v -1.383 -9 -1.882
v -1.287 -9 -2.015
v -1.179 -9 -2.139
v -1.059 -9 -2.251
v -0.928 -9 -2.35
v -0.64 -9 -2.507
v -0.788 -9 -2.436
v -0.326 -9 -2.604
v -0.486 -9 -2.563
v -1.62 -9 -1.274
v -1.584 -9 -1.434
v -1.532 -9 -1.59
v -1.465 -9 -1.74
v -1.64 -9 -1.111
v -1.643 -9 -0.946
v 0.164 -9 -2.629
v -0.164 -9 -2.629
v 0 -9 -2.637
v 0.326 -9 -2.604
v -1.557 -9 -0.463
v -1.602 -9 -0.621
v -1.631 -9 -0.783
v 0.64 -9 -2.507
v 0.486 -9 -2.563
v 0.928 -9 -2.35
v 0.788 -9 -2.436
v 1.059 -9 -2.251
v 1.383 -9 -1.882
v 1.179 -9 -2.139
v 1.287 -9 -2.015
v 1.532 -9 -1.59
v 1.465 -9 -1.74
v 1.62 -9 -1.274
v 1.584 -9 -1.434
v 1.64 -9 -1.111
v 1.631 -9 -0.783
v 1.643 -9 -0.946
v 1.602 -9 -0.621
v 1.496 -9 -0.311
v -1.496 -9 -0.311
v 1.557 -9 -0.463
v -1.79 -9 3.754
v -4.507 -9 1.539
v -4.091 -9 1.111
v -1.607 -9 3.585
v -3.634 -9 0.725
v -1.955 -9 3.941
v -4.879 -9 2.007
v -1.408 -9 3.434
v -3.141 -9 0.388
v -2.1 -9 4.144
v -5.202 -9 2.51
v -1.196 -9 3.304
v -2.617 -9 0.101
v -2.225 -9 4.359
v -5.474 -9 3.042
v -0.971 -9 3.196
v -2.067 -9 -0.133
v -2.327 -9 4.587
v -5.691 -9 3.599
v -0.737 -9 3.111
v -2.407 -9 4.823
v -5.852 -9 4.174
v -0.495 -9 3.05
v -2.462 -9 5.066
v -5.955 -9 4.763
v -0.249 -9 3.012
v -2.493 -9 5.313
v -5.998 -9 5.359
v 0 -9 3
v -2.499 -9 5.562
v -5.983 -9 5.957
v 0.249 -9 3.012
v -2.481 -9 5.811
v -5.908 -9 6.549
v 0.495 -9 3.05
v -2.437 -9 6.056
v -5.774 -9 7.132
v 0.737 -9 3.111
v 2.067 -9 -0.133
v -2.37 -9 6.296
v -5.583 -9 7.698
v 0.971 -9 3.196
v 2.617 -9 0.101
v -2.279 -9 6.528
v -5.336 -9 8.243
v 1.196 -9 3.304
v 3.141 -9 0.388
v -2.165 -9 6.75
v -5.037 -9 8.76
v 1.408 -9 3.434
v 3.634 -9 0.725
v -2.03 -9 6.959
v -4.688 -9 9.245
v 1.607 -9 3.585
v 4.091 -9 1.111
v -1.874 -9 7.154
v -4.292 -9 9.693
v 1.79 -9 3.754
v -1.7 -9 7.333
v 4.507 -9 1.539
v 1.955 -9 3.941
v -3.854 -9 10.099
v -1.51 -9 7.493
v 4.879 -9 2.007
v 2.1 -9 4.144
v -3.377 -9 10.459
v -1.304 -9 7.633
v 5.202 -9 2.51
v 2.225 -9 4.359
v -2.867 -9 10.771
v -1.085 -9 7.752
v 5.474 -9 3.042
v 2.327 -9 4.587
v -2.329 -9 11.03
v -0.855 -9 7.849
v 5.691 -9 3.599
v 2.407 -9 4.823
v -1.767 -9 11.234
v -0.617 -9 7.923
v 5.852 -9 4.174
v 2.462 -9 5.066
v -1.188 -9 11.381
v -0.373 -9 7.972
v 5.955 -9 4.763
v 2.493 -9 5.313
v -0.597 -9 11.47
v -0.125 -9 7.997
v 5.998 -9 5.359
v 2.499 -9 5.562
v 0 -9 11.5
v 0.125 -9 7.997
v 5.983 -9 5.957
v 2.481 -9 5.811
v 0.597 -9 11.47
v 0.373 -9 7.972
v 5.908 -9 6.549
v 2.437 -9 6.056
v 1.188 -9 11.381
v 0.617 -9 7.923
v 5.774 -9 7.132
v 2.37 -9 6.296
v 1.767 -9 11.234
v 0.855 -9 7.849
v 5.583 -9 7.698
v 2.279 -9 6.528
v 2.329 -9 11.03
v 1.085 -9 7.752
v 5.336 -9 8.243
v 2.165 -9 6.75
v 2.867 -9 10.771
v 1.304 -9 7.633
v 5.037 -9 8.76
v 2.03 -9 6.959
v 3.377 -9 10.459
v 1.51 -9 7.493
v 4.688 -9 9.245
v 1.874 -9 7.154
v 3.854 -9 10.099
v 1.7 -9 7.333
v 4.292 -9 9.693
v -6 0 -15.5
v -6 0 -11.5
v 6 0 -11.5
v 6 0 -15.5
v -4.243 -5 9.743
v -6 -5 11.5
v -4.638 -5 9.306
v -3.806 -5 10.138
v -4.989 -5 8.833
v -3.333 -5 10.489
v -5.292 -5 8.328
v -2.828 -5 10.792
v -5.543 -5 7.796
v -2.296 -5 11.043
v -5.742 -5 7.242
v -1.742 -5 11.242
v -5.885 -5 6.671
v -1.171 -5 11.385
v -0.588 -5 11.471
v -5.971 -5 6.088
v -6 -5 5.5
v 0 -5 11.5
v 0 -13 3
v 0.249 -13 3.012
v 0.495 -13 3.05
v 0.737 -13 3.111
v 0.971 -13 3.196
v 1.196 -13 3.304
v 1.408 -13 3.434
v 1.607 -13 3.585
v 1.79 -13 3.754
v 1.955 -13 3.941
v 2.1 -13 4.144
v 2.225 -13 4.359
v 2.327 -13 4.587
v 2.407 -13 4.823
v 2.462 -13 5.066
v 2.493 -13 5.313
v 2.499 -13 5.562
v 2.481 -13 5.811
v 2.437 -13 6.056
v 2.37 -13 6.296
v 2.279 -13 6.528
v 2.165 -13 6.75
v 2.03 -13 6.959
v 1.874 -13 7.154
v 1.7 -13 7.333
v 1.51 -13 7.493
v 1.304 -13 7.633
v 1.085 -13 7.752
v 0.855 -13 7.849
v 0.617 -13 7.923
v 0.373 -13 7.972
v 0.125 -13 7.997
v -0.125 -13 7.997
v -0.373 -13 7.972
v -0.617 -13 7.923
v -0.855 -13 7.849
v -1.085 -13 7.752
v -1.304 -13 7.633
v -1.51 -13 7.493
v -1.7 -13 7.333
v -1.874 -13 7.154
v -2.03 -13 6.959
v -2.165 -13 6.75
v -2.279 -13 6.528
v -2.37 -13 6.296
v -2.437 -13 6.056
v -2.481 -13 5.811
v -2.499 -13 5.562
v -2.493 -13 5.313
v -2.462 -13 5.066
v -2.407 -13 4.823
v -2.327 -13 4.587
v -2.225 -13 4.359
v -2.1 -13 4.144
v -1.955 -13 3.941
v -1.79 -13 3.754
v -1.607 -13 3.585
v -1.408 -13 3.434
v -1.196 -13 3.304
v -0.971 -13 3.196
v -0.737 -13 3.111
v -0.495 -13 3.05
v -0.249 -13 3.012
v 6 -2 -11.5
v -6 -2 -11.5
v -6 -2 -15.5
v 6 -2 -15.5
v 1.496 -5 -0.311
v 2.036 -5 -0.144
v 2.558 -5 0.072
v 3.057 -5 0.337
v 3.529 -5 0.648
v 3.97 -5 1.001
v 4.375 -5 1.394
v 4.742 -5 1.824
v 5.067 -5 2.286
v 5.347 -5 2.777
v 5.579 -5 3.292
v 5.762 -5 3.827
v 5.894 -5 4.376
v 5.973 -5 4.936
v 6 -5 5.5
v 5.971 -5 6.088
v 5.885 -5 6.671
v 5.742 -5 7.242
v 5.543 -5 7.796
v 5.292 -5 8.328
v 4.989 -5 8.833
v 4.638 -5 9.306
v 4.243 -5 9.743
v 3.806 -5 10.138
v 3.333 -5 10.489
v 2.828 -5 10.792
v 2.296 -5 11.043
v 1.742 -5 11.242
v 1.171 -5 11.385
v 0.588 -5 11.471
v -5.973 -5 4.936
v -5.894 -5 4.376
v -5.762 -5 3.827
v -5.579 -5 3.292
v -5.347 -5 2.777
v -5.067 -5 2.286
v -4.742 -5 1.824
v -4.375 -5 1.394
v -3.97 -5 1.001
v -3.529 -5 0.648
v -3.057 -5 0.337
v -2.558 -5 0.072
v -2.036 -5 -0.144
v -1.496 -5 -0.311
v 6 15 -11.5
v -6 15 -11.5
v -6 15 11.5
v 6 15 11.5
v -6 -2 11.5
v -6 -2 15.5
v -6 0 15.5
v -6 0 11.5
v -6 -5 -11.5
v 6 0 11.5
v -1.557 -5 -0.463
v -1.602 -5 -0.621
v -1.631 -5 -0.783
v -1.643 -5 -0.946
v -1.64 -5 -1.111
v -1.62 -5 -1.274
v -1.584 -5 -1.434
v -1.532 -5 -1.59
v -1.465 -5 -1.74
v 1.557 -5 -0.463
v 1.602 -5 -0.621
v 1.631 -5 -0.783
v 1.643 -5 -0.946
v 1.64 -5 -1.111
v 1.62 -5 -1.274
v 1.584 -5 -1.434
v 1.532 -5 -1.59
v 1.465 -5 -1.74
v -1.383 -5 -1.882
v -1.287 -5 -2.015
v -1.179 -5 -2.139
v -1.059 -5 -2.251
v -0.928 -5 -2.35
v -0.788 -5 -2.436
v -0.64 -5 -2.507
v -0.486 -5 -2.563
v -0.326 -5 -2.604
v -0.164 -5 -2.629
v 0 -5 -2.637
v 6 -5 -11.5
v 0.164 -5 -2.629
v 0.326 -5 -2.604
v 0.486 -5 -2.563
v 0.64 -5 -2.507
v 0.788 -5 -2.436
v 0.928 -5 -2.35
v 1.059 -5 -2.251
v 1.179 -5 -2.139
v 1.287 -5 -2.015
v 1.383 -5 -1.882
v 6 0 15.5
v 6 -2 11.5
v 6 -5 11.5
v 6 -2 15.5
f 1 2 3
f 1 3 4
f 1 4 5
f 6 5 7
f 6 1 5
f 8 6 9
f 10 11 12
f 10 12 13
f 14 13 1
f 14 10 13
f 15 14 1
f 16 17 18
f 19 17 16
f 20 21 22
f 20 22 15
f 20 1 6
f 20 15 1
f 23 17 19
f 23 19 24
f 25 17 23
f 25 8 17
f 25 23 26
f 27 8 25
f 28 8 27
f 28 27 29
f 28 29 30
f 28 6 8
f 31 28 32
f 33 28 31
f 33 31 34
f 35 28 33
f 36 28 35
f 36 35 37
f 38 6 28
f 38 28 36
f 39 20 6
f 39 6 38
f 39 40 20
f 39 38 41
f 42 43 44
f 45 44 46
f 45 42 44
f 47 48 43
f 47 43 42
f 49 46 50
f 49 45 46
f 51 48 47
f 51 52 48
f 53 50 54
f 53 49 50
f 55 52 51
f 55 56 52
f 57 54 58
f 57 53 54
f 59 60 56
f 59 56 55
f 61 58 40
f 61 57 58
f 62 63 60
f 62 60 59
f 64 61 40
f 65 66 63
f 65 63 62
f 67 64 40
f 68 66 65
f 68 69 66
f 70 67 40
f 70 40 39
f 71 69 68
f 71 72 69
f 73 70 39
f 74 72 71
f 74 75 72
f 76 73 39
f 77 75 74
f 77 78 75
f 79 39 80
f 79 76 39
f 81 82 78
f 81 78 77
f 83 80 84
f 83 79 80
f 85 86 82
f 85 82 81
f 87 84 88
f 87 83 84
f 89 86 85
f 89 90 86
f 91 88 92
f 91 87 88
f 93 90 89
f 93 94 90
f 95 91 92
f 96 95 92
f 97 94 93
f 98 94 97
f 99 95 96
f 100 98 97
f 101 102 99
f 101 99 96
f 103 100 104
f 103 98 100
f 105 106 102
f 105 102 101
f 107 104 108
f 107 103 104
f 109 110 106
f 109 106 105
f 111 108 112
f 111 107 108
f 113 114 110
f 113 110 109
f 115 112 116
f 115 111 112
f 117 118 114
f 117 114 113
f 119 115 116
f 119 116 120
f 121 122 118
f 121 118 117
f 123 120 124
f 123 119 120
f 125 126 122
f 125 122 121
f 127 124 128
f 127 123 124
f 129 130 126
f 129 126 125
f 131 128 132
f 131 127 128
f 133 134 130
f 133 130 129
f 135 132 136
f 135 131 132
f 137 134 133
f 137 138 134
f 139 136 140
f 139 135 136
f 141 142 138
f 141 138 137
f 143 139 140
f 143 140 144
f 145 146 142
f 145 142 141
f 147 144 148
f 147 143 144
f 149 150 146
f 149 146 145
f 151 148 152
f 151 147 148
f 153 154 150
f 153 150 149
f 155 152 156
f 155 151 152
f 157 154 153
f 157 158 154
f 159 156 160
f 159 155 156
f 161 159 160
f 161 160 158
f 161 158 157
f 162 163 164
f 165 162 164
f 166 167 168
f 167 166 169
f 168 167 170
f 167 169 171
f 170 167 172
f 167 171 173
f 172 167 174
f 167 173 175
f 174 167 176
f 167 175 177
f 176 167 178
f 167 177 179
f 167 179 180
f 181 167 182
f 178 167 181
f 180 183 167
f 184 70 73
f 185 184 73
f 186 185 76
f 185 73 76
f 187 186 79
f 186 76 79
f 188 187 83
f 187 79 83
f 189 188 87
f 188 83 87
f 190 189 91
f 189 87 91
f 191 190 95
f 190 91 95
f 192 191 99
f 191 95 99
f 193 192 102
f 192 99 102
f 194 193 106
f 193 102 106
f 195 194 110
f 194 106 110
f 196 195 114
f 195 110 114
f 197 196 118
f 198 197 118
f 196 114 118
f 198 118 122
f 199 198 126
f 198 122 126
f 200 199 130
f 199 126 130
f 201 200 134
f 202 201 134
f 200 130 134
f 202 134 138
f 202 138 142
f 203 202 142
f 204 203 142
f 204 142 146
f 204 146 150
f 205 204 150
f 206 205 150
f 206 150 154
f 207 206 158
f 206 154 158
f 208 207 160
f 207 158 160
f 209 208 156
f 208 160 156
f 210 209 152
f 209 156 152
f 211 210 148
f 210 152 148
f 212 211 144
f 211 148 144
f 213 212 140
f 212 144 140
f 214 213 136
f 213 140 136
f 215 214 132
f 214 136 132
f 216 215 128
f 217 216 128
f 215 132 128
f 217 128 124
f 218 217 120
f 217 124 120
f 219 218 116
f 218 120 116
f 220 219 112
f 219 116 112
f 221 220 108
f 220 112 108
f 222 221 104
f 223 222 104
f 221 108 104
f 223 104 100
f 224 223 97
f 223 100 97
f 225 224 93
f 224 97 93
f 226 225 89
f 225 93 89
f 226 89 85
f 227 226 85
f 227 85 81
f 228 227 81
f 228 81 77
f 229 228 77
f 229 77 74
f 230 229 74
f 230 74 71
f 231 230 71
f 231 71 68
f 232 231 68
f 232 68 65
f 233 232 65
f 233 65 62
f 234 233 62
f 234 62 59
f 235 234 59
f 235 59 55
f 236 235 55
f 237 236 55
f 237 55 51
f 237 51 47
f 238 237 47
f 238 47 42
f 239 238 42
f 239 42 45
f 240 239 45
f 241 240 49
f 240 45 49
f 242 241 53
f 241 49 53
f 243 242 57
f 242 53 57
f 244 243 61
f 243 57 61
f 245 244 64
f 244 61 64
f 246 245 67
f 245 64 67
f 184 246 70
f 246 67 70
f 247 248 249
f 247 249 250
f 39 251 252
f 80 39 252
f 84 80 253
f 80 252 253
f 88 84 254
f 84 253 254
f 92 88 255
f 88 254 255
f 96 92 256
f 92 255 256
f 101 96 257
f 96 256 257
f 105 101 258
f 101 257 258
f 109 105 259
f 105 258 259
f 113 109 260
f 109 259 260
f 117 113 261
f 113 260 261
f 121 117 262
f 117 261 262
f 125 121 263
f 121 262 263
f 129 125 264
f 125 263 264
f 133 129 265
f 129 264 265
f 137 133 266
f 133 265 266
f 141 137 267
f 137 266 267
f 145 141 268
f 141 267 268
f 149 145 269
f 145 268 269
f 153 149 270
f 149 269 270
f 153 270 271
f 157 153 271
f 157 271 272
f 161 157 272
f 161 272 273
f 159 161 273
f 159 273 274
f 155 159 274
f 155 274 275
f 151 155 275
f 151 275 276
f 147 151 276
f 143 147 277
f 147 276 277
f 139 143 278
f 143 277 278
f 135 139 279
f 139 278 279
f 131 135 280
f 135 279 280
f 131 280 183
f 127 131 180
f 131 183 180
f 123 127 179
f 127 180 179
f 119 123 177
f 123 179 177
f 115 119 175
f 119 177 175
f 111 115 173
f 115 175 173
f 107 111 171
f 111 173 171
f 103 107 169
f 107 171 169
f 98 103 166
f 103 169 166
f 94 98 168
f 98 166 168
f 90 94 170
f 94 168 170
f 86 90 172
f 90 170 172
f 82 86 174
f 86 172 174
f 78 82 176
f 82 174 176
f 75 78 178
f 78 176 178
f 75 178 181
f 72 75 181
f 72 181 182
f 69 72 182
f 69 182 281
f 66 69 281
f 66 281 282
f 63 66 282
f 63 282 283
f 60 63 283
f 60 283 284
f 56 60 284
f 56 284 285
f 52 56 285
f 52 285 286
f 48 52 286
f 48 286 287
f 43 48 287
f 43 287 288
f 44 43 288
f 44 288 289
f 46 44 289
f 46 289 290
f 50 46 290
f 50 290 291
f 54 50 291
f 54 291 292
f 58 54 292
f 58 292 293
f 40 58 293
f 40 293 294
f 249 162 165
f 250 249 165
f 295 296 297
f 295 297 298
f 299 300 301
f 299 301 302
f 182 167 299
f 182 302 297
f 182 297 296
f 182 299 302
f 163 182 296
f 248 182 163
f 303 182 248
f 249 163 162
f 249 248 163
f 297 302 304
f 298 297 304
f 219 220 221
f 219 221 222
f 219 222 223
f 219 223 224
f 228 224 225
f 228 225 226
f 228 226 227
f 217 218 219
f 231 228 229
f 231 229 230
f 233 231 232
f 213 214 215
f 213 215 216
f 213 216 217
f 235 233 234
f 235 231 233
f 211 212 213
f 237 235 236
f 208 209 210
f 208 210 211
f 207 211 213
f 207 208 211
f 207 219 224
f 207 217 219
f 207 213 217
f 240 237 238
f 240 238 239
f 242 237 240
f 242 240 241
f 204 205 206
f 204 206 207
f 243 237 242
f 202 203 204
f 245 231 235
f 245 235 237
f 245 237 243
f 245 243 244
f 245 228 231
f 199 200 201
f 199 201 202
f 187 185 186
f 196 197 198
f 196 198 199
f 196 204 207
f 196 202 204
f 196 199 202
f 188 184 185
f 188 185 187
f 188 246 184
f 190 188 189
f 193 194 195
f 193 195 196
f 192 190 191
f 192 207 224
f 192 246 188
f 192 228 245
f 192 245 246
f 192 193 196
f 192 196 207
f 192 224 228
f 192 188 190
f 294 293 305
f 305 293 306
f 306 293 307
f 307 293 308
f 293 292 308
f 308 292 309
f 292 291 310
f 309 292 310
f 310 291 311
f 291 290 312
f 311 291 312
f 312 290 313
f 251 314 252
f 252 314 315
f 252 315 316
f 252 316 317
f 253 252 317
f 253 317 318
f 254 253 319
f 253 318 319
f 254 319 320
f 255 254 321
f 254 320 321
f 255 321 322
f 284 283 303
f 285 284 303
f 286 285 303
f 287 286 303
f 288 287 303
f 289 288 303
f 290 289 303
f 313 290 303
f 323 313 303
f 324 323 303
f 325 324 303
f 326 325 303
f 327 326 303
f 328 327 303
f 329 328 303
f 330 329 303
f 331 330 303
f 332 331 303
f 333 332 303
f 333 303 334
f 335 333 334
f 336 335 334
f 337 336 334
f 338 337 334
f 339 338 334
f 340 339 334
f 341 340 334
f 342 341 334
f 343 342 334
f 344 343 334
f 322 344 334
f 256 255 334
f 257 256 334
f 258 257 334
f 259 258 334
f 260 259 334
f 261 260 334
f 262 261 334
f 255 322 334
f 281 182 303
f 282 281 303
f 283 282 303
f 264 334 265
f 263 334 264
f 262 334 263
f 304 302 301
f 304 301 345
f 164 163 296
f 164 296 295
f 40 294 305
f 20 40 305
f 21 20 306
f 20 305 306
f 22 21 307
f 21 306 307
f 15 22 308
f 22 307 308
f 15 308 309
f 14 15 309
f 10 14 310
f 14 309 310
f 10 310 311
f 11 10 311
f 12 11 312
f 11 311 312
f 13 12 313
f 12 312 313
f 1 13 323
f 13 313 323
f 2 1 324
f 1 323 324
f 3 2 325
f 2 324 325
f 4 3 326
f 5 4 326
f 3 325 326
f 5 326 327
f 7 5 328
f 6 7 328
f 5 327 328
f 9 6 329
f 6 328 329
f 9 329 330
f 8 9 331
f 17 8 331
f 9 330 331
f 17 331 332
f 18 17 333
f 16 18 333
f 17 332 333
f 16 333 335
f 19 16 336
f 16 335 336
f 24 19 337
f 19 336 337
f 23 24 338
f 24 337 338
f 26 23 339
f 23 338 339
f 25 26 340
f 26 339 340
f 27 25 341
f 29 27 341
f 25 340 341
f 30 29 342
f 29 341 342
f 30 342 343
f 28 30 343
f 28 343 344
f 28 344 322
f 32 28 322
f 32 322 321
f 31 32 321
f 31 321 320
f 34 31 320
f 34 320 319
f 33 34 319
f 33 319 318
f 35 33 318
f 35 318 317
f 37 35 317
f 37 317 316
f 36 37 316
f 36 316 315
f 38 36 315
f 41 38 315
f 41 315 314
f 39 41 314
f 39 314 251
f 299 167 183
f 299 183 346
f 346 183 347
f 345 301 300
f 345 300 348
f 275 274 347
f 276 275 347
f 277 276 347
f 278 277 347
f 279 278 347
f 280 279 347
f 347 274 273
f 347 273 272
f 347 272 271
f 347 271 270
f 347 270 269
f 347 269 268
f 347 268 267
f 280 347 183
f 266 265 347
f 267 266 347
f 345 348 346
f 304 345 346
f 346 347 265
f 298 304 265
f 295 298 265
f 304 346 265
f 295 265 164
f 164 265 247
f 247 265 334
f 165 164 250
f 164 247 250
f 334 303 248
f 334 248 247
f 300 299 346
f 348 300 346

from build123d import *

# Parameters (mm, degrees)
EXTRUDE_2_DEPTH      = 15
EXTRUDE_2_DEPTH_BACK = 5
SKETCH_1_W           = 12
SKETCH_1_H           = 23
EXTRUDE_3_DEPTH      = 4
SKETCH_3_R           = 2.5
EXTRUDE_4_DEPTH      = 4
SKETCH_4_W           = 12
SKETCH_4_H           = 4
EXTRUDE_5_DEPTH      = 2


with BuildPart() as part:
    # 草图1 → 凸台-拉伸2 (new, two sides: drawn at the far end of the back side and taken through both)
    with BuildSketch(Plane(origin=(0, 0, 0), x_dir=(1, 0, 0), z_dir=(0, 1, 0)).offset(-EXTRUDE_2_DEPTH_BACK)):
        Rectangle(SKETCH_1_W, SKETCH_1_H)
    extrude(amount=EXTRUDE_2_DEPTH + EXTRUDE_2_DEPTH_BACK)

    # 草图2 → 凸台-拉伸3 (add)
    with BuildSketch(Plane.XZ.offset(5)):
        with BuildLine():
            ThreePointArc((1.495922385, -0.310526329), (0, 11.5), (-1.495922385, -0.310526329))
            ThreePointArc((-1.495922385, -0.310526329), (0, -2.636784312), (1.495922385, -0.310526329))
        make_face()
    extrude(amount=EXTRUDE_3_DEPTH)

    # 草图3 → 凸台-拉伸4 (add)
    with BuildSketch(Plane.XZ.offset(9)):
        with Locations(Location((0, 5.5, 0), (0, 0, 270))):
            Circle(SKETCH_3_R)
    extrude(amount=EXTRUDE_4_DEPTH)

    # 草图4 → 凸台-拉伸5 (add)
    with BuildSketch(Plane(origin=(0, 0, 0), x_dir=(1, 0, 0), z_dir=(0, 1, 0))):
        with Locations((0, -13.5)):
            Rectangle(SKETCH_4_W, SKETCH_4_H)
    extrude_5 = extrude(amount=-EXTRUDE_5_DEPTH)

    # 镜向1: 凸台-拉伸5 across plane
    add(extrude_5.mirror(Plane.XY))


solid = part.part
